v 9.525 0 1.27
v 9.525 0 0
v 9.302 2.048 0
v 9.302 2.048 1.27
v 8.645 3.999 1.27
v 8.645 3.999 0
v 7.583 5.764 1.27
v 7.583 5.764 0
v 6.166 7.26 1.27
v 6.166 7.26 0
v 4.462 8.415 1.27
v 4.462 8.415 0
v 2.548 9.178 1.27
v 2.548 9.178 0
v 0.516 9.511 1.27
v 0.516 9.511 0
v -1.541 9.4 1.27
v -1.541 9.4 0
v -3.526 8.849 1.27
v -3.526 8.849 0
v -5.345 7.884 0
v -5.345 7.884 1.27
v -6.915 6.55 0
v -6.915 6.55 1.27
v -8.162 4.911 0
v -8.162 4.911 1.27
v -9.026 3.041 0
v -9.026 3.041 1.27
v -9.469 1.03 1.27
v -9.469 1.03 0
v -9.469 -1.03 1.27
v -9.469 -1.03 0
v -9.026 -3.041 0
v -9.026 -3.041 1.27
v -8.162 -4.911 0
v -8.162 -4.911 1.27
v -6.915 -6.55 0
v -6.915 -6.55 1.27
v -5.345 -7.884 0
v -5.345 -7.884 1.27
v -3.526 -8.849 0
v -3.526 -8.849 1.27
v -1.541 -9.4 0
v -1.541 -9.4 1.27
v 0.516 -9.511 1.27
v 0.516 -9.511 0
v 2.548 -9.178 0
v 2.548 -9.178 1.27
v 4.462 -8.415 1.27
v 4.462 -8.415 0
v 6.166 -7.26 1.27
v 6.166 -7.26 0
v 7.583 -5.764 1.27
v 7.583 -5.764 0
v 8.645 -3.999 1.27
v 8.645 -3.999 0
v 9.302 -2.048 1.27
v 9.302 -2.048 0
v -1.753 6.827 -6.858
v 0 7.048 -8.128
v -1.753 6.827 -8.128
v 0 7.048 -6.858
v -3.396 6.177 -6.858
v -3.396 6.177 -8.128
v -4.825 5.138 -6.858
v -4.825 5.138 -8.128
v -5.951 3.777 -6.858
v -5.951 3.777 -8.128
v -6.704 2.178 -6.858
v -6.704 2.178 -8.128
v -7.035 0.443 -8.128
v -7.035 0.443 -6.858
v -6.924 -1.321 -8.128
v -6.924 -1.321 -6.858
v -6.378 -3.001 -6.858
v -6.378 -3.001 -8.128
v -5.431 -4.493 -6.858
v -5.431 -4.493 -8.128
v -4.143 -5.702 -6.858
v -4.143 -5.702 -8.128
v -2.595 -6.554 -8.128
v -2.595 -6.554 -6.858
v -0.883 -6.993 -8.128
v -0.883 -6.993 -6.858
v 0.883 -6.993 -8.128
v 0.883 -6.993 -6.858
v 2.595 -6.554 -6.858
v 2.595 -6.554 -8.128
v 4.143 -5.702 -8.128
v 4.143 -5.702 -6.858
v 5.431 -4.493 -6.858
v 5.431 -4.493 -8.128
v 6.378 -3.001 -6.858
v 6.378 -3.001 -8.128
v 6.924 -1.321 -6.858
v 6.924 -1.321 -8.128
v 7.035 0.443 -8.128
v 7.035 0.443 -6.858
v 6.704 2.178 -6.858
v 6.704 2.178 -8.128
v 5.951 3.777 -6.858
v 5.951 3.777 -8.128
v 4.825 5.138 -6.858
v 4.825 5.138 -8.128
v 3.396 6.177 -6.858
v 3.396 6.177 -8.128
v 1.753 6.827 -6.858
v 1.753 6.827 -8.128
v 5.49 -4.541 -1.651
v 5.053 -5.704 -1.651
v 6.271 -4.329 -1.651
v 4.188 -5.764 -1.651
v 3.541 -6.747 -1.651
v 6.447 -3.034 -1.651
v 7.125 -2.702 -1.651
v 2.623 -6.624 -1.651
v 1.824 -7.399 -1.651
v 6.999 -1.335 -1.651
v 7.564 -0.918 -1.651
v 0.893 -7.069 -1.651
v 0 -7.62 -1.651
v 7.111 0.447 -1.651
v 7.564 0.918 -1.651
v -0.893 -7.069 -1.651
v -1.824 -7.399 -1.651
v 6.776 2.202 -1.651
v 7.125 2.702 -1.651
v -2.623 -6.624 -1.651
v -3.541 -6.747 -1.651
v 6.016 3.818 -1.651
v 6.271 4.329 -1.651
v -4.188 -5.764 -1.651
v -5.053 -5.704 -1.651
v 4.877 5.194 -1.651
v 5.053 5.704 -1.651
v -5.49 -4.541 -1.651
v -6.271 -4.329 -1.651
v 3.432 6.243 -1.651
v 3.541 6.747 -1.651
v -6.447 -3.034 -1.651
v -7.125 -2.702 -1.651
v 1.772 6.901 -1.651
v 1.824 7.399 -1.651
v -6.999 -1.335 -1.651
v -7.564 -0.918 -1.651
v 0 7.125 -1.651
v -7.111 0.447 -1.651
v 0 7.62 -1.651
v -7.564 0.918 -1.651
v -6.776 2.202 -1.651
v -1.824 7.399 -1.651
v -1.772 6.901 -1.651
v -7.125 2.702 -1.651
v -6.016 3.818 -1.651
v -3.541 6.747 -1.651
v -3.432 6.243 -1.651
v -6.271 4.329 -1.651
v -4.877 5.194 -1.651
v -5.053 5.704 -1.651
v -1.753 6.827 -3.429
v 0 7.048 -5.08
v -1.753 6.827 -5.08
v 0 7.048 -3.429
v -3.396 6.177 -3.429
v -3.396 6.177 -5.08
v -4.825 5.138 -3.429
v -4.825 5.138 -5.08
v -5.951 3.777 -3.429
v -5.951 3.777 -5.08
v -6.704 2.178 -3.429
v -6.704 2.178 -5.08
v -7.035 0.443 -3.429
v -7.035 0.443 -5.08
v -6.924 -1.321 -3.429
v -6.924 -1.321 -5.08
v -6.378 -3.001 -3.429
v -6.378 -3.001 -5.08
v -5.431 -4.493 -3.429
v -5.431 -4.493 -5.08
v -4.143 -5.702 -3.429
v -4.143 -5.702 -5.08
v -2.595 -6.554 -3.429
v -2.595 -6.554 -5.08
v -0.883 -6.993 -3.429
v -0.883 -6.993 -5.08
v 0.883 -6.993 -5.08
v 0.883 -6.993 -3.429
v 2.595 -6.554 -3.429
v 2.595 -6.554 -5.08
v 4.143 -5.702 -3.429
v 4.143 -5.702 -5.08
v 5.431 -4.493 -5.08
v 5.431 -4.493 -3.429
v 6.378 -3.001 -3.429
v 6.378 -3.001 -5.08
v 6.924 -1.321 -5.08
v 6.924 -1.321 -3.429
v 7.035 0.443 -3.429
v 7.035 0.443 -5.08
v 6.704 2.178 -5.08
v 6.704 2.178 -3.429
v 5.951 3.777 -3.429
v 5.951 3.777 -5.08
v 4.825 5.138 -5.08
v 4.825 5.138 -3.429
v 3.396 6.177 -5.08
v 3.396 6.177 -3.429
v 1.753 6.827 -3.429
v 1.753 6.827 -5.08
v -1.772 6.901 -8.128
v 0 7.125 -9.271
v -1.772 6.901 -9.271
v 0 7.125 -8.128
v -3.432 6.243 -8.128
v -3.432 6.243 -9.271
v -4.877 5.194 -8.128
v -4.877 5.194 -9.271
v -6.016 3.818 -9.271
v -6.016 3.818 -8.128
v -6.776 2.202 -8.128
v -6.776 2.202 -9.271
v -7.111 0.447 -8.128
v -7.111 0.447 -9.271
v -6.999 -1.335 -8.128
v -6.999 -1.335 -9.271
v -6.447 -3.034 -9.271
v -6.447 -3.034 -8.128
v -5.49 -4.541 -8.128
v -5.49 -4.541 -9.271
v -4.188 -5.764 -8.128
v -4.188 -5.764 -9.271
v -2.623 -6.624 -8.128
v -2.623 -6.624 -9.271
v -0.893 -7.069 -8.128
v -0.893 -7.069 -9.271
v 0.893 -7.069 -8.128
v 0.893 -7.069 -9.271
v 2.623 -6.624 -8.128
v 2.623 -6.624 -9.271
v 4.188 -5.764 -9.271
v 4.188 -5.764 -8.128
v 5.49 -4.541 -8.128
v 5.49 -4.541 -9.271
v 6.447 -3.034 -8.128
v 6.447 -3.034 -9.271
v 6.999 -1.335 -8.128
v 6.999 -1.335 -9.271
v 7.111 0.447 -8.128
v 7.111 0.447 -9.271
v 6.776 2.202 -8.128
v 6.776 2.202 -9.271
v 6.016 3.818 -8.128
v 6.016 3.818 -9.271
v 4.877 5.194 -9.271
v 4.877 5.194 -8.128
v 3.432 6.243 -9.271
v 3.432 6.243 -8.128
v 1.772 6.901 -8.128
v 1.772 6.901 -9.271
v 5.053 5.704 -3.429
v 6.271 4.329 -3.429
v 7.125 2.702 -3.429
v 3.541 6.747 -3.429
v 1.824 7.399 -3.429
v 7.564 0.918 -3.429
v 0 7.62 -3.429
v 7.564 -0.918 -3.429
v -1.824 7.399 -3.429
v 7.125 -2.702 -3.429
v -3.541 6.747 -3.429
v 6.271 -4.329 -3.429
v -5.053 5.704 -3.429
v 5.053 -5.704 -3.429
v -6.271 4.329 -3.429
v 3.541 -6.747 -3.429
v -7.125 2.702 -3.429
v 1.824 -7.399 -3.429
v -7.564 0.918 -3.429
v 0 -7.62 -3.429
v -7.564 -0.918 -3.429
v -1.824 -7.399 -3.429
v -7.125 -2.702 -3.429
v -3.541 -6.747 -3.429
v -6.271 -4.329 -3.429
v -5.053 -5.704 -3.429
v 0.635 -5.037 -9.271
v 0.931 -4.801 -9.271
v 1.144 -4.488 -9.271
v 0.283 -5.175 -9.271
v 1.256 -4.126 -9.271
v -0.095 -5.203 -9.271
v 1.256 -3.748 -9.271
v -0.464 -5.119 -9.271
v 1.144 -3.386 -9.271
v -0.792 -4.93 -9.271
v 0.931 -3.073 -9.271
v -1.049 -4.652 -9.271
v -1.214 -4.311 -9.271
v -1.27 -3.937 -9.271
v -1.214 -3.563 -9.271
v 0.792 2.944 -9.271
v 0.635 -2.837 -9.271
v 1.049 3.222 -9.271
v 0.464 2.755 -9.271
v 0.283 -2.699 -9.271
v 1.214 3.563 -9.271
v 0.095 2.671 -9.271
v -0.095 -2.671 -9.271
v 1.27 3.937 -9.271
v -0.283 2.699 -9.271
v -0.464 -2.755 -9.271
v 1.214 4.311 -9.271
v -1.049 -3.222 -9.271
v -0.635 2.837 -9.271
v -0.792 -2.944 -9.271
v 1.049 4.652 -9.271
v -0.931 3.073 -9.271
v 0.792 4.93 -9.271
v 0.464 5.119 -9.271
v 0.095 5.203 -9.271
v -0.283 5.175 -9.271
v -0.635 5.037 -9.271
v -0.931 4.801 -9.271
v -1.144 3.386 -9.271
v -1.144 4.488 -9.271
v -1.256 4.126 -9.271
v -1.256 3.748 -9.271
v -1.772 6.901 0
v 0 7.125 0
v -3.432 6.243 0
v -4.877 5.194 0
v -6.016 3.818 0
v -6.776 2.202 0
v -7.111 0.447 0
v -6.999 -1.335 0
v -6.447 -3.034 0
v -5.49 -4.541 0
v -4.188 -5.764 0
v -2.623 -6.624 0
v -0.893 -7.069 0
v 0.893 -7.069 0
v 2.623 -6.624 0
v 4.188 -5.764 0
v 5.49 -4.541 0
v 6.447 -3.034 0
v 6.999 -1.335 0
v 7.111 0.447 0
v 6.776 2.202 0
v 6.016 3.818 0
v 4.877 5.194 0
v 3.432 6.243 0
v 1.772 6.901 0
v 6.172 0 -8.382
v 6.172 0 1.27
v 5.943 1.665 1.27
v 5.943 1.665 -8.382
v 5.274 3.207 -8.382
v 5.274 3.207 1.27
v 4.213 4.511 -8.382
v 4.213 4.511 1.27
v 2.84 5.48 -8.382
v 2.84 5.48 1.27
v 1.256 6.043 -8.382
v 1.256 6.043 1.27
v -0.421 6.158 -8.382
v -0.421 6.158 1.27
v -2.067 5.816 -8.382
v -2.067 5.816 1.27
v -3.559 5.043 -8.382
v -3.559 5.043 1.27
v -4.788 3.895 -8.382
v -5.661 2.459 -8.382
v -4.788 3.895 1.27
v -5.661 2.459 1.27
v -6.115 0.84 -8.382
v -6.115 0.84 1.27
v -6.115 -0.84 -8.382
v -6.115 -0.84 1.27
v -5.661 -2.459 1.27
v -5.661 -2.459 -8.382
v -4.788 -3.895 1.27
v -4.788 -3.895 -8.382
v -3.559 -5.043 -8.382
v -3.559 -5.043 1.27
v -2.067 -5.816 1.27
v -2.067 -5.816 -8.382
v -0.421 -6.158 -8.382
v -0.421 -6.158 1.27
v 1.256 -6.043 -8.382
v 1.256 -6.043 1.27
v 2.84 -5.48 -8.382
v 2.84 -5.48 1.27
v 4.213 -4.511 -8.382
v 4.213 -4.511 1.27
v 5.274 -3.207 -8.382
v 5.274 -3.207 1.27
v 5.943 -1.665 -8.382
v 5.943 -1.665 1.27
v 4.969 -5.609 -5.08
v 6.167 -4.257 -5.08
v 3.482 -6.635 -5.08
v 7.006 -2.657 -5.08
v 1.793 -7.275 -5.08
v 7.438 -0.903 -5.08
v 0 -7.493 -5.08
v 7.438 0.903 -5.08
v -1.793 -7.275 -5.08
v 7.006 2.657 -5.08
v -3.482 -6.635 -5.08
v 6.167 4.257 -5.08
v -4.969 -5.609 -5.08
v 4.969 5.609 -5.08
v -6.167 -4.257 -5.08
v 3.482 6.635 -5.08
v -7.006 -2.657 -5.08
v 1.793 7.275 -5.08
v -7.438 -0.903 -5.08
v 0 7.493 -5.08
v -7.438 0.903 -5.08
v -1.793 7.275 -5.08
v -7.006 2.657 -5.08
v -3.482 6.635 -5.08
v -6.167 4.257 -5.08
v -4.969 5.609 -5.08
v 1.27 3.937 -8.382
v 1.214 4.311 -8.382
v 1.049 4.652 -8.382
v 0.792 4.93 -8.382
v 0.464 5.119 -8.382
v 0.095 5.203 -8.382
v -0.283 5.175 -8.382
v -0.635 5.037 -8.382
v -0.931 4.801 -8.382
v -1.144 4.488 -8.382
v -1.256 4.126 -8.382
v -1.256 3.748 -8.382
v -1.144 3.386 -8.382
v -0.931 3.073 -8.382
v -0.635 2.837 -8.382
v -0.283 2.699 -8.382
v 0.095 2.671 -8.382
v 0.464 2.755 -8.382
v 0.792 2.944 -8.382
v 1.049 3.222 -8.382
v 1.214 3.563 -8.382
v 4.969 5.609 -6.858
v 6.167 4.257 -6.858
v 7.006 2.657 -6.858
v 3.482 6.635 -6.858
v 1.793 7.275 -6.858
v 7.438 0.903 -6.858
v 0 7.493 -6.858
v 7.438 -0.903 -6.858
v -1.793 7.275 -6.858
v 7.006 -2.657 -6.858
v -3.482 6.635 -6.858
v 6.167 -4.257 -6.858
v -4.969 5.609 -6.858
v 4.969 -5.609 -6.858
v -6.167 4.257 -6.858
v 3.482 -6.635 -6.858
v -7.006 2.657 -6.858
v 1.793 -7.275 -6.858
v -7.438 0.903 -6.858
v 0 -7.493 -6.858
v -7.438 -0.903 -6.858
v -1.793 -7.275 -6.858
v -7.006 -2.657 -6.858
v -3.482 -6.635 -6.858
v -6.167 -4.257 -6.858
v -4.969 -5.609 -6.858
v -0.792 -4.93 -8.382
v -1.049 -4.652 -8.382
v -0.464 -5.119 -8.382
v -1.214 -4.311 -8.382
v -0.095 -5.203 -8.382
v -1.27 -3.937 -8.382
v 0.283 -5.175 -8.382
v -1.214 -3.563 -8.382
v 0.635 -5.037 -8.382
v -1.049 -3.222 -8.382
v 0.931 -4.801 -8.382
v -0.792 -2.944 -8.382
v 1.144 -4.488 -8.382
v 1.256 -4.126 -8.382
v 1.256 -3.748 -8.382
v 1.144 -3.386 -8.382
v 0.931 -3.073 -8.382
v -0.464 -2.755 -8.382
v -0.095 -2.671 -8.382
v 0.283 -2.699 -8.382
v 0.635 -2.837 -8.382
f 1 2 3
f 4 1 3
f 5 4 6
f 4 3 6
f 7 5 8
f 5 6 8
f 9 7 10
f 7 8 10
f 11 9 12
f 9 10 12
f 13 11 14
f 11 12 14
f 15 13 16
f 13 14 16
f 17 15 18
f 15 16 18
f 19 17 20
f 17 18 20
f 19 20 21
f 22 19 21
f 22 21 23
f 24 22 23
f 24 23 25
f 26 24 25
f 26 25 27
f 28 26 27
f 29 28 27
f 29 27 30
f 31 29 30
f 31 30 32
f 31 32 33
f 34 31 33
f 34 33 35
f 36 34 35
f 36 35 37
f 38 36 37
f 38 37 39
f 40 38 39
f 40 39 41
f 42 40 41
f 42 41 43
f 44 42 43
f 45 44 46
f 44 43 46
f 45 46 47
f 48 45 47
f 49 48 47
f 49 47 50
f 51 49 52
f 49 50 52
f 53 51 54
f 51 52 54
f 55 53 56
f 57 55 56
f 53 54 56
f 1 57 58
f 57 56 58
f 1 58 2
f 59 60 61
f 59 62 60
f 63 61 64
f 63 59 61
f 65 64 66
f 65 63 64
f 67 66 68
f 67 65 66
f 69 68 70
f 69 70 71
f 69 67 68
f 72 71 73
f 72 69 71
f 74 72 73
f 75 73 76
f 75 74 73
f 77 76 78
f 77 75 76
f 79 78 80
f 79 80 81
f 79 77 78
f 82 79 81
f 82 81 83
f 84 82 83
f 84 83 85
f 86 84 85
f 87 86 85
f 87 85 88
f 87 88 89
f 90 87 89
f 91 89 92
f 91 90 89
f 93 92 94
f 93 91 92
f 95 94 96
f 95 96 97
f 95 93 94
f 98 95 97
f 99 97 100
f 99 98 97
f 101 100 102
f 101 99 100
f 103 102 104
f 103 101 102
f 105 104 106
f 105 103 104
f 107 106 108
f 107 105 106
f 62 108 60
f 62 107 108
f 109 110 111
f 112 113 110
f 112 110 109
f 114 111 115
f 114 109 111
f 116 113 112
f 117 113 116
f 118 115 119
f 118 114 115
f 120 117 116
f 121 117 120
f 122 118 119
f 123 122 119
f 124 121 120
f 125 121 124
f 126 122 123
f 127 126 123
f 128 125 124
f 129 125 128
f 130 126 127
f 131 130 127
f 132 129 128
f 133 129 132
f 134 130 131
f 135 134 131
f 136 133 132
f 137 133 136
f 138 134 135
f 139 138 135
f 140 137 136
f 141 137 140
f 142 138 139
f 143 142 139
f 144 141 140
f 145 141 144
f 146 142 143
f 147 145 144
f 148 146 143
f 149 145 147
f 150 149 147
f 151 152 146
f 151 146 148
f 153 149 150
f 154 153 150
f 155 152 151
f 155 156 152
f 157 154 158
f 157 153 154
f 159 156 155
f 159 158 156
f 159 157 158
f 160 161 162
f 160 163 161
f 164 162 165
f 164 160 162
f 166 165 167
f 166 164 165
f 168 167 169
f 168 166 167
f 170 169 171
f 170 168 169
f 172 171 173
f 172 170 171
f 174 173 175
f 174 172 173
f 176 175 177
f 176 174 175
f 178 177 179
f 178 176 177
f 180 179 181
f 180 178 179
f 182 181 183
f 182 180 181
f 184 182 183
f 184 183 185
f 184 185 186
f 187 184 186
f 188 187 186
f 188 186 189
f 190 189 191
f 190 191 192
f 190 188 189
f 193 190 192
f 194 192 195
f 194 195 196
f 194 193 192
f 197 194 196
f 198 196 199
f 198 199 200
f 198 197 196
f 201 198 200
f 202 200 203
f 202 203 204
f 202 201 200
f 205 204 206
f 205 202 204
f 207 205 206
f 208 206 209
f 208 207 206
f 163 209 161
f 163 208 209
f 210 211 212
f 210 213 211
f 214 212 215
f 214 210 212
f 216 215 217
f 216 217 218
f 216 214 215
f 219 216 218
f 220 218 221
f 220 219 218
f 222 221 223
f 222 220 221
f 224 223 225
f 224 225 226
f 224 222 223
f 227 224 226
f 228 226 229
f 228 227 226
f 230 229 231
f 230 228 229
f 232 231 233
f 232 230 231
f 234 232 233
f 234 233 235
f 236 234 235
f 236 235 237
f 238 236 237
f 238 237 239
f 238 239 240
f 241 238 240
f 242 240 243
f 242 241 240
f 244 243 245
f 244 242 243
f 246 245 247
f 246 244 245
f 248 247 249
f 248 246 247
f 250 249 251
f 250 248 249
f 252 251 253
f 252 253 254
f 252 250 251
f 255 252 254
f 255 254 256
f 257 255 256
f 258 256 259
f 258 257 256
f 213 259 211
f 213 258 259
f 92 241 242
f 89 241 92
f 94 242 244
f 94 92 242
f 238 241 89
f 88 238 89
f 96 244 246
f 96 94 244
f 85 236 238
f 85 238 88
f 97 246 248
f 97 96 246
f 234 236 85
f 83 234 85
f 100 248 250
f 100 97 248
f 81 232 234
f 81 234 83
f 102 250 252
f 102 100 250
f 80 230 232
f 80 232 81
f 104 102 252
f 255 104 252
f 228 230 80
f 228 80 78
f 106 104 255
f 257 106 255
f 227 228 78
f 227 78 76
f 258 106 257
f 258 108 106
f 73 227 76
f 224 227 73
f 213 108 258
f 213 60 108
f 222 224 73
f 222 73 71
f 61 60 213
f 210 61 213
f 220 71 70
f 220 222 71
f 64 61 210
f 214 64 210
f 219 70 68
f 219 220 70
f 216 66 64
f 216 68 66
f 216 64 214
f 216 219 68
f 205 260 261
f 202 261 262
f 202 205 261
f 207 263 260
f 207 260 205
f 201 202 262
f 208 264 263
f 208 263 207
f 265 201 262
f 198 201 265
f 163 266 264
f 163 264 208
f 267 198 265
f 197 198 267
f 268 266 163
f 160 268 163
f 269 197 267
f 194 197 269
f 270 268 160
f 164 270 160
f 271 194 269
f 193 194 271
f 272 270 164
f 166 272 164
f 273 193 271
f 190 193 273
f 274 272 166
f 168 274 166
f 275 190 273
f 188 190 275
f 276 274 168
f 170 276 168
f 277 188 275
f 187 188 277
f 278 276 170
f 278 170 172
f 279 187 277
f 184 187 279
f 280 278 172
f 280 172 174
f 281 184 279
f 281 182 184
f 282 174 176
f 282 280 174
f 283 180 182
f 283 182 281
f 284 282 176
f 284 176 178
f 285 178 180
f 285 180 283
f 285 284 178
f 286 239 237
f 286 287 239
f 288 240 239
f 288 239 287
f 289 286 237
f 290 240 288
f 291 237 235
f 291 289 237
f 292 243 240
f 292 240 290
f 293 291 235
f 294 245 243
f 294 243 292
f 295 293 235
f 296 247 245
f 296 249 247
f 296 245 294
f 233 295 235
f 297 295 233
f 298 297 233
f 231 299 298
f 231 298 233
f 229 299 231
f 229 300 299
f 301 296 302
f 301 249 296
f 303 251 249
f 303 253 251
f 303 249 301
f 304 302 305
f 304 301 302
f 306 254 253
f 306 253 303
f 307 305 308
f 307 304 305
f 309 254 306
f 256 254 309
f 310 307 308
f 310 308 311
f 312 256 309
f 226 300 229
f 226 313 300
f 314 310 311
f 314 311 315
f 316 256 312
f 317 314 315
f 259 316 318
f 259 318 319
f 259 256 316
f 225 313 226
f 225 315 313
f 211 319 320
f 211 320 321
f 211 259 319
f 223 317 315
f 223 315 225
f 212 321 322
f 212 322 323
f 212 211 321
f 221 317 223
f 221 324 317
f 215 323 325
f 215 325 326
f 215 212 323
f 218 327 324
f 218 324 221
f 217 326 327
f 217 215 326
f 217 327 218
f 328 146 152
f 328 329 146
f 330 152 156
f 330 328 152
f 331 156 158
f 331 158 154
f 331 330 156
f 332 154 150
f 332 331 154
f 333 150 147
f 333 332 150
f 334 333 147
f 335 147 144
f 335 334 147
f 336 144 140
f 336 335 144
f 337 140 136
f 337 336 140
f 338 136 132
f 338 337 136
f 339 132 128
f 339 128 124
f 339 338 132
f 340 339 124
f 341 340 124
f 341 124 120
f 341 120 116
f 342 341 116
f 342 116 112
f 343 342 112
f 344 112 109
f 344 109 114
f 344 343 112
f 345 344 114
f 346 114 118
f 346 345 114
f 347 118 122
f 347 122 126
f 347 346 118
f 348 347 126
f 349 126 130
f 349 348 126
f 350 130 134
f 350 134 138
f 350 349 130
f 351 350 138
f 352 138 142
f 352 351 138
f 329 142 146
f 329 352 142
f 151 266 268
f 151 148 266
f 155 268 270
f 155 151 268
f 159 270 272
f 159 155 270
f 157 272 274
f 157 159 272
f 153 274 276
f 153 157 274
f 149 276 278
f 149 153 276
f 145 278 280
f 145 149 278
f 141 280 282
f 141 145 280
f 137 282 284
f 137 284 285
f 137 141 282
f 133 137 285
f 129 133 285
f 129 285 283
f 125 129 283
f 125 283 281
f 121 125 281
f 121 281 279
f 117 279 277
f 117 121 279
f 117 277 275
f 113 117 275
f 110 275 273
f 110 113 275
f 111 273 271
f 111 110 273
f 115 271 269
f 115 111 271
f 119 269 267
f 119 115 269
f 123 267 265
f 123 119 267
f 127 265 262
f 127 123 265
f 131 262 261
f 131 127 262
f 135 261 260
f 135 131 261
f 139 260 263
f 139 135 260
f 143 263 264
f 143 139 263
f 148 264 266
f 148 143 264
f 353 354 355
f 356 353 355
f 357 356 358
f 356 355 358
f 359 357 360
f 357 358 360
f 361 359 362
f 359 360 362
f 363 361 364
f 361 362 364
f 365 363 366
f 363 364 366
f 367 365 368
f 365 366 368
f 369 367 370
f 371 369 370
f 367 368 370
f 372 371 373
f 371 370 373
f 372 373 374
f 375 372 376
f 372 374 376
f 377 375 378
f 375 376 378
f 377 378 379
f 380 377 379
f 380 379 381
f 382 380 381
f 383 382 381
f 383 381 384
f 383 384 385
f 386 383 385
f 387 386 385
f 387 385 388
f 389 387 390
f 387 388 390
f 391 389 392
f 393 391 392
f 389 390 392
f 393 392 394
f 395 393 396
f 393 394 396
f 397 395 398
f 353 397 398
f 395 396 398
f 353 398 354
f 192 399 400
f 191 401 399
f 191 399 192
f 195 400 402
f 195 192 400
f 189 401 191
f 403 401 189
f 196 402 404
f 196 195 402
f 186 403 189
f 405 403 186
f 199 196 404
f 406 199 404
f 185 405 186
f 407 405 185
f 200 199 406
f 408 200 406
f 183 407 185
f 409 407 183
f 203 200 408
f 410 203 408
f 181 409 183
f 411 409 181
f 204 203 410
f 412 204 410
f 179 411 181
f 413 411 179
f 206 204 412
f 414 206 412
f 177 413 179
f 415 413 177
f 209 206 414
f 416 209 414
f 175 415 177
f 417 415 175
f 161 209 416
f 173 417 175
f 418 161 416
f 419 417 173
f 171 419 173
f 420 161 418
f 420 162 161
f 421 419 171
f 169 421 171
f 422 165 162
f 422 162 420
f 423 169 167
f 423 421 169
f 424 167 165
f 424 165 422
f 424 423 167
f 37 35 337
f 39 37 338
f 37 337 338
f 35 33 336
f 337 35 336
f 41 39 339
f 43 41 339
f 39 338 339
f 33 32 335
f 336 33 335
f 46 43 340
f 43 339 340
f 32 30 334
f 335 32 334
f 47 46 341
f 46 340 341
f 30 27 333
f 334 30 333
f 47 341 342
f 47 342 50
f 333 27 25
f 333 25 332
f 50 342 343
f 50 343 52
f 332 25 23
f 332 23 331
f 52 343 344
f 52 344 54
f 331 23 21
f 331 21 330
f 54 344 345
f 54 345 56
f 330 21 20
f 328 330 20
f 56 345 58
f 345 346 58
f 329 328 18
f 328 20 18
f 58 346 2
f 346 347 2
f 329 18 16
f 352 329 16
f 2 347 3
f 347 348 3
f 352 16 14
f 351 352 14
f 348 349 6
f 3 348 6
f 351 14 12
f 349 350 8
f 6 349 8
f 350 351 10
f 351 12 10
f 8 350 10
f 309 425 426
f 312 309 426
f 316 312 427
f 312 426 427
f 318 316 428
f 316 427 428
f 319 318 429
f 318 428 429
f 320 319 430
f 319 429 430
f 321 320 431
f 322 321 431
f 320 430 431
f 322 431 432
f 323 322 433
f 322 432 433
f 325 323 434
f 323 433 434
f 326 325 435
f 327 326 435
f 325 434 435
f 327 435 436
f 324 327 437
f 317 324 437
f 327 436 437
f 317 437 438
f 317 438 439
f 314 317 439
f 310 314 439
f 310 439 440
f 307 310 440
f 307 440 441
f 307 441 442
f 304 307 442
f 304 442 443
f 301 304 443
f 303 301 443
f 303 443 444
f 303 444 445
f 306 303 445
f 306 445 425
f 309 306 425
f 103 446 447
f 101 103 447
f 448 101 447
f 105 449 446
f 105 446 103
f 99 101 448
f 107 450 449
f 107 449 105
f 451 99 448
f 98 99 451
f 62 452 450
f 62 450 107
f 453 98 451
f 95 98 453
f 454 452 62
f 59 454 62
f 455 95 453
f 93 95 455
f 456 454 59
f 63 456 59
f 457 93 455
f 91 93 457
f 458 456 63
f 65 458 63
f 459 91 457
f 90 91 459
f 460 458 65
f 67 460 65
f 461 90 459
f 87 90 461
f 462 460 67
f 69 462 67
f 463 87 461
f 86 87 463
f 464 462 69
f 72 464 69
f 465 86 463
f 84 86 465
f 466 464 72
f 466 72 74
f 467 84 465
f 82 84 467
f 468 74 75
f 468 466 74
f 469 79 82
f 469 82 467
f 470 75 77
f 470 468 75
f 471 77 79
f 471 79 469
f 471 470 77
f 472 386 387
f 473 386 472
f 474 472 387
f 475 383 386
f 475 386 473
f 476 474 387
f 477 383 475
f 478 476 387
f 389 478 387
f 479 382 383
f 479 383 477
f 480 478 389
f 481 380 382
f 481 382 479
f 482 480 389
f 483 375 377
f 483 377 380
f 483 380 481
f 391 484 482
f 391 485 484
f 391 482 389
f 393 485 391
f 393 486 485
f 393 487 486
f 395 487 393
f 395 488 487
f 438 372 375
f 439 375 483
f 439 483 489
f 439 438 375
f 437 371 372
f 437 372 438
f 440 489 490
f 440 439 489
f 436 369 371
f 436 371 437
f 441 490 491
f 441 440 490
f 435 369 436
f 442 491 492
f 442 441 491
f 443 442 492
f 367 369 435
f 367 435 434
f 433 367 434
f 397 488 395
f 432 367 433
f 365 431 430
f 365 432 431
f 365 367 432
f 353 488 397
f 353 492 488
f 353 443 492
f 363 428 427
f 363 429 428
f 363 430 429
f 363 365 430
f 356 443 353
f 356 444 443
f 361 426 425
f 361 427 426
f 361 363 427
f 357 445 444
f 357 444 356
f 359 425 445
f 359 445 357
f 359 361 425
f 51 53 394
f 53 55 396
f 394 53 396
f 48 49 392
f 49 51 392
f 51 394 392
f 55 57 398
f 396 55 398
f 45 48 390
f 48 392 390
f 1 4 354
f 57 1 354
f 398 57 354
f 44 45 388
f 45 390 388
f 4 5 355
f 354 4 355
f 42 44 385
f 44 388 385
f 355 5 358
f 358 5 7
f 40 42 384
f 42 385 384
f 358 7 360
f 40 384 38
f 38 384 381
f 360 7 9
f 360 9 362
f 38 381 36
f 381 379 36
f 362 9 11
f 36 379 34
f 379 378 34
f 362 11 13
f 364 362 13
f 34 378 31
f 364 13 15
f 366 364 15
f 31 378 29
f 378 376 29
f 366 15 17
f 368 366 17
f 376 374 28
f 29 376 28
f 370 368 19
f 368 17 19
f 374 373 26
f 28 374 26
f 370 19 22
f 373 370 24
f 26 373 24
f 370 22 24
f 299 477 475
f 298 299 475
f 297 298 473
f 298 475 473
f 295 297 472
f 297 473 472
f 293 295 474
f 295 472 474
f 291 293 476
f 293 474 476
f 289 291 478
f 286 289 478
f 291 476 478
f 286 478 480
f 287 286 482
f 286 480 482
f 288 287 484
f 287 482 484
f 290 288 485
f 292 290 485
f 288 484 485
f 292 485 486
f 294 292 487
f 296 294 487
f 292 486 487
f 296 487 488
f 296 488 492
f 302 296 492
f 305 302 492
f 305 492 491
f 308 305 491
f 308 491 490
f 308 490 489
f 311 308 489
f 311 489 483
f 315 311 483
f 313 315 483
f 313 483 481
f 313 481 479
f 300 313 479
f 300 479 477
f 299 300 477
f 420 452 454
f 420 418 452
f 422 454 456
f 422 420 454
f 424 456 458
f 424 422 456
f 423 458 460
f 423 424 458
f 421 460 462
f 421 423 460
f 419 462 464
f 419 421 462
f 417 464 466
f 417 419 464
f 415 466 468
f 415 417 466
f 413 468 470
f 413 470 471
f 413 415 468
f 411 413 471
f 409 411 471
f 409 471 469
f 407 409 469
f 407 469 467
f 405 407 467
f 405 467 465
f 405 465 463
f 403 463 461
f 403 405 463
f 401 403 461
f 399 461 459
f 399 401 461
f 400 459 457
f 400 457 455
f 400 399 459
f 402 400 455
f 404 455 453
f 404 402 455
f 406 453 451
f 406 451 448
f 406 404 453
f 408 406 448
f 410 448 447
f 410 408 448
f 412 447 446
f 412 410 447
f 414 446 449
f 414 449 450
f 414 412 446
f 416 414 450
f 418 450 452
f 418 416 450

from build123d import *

# Parameters (mm, degrees)
SKETCH1_R           = 9.525
BOSS_EXTRUDE1_DEPTH = 1.27
SKETCH2_R           = 8.3185
BOSS_EXTRUDE2_DEPTH = 10.541
SKETCH3_R           = 6.1722
CUT_EXTRUDE1_DEPTH  = 9.652
SKETCH4_R           = 1.27
CUT_EXTRUDE2_DEPTH  = 17.571431863


with BuildPart() as part:
    # Sketch1 → Boss-Extrude1 (new body)
    with BuildSketch(Plane.XY):
        Circle(SKETCH1_R)
    extrude(amount=BOSS_EXTRUDE1_DEPTH)

    # Sketch2 → Boss-Extrude2 (add)
    with BuildSketch(Plane(origin=(0, 0, 1.27), x_dir=(-1, 0, 0), z_dir=(0, 0, -1))):
        Circle(SKETCH2_R)
    extrude(amount=BOSS_EXTRUDE2_DEPTH)

    # Sketch3 → Cut-Extrude1 (cut)
    with BuildSketch(Plane.XY.offset(1.27)):
        Circle(SKETCH3_R)
    extrude(amount=-CUT_EXTRUDE1_DEPTH, mode=Mode.SUBTRACT)

    # Sketch4 → Cut-Extrude2 (cut, through all)
    with BuildSketch(Plane.XY.offset(-8.382)):
        with Locations((0, 3.937)):
            Circle(SKETCH4_R)
        with Locations(Location((0, -3.937, 0), (0, 0, 180))):
            Circle(SKETCH4_R)
    extrude(amount=-CUT_EXTRUDE2_DEPTH, mode=Mode.SUBTRACT)

    # Sketch5 → Cut-Revolve1 (revolve, cut)
    with BuildSketch(Plane(origin=(0, 0, 0), x_dir=(0, 0, -1), z_dir=(1, 0, 0))):
        Polygon((0, 7.1247), (0, 9.525), (9.271, 9.525), (9.271, 7.1247), (8.128, 7.1247), (8.128, 7.0485), (6.858, 7.0485), (6.858, 7.493), (5.08, 7.493), (5.08, 7.0485), (3.429, 7.0485), (3.429, 7.62), (1.651, 7.62), (1.651, 7.1247), align=None)
    revolve(axis=Axis((0, 0, 0), (0, 0, 1)), mode=Mode.SUBTRACT)


solid = part.part
